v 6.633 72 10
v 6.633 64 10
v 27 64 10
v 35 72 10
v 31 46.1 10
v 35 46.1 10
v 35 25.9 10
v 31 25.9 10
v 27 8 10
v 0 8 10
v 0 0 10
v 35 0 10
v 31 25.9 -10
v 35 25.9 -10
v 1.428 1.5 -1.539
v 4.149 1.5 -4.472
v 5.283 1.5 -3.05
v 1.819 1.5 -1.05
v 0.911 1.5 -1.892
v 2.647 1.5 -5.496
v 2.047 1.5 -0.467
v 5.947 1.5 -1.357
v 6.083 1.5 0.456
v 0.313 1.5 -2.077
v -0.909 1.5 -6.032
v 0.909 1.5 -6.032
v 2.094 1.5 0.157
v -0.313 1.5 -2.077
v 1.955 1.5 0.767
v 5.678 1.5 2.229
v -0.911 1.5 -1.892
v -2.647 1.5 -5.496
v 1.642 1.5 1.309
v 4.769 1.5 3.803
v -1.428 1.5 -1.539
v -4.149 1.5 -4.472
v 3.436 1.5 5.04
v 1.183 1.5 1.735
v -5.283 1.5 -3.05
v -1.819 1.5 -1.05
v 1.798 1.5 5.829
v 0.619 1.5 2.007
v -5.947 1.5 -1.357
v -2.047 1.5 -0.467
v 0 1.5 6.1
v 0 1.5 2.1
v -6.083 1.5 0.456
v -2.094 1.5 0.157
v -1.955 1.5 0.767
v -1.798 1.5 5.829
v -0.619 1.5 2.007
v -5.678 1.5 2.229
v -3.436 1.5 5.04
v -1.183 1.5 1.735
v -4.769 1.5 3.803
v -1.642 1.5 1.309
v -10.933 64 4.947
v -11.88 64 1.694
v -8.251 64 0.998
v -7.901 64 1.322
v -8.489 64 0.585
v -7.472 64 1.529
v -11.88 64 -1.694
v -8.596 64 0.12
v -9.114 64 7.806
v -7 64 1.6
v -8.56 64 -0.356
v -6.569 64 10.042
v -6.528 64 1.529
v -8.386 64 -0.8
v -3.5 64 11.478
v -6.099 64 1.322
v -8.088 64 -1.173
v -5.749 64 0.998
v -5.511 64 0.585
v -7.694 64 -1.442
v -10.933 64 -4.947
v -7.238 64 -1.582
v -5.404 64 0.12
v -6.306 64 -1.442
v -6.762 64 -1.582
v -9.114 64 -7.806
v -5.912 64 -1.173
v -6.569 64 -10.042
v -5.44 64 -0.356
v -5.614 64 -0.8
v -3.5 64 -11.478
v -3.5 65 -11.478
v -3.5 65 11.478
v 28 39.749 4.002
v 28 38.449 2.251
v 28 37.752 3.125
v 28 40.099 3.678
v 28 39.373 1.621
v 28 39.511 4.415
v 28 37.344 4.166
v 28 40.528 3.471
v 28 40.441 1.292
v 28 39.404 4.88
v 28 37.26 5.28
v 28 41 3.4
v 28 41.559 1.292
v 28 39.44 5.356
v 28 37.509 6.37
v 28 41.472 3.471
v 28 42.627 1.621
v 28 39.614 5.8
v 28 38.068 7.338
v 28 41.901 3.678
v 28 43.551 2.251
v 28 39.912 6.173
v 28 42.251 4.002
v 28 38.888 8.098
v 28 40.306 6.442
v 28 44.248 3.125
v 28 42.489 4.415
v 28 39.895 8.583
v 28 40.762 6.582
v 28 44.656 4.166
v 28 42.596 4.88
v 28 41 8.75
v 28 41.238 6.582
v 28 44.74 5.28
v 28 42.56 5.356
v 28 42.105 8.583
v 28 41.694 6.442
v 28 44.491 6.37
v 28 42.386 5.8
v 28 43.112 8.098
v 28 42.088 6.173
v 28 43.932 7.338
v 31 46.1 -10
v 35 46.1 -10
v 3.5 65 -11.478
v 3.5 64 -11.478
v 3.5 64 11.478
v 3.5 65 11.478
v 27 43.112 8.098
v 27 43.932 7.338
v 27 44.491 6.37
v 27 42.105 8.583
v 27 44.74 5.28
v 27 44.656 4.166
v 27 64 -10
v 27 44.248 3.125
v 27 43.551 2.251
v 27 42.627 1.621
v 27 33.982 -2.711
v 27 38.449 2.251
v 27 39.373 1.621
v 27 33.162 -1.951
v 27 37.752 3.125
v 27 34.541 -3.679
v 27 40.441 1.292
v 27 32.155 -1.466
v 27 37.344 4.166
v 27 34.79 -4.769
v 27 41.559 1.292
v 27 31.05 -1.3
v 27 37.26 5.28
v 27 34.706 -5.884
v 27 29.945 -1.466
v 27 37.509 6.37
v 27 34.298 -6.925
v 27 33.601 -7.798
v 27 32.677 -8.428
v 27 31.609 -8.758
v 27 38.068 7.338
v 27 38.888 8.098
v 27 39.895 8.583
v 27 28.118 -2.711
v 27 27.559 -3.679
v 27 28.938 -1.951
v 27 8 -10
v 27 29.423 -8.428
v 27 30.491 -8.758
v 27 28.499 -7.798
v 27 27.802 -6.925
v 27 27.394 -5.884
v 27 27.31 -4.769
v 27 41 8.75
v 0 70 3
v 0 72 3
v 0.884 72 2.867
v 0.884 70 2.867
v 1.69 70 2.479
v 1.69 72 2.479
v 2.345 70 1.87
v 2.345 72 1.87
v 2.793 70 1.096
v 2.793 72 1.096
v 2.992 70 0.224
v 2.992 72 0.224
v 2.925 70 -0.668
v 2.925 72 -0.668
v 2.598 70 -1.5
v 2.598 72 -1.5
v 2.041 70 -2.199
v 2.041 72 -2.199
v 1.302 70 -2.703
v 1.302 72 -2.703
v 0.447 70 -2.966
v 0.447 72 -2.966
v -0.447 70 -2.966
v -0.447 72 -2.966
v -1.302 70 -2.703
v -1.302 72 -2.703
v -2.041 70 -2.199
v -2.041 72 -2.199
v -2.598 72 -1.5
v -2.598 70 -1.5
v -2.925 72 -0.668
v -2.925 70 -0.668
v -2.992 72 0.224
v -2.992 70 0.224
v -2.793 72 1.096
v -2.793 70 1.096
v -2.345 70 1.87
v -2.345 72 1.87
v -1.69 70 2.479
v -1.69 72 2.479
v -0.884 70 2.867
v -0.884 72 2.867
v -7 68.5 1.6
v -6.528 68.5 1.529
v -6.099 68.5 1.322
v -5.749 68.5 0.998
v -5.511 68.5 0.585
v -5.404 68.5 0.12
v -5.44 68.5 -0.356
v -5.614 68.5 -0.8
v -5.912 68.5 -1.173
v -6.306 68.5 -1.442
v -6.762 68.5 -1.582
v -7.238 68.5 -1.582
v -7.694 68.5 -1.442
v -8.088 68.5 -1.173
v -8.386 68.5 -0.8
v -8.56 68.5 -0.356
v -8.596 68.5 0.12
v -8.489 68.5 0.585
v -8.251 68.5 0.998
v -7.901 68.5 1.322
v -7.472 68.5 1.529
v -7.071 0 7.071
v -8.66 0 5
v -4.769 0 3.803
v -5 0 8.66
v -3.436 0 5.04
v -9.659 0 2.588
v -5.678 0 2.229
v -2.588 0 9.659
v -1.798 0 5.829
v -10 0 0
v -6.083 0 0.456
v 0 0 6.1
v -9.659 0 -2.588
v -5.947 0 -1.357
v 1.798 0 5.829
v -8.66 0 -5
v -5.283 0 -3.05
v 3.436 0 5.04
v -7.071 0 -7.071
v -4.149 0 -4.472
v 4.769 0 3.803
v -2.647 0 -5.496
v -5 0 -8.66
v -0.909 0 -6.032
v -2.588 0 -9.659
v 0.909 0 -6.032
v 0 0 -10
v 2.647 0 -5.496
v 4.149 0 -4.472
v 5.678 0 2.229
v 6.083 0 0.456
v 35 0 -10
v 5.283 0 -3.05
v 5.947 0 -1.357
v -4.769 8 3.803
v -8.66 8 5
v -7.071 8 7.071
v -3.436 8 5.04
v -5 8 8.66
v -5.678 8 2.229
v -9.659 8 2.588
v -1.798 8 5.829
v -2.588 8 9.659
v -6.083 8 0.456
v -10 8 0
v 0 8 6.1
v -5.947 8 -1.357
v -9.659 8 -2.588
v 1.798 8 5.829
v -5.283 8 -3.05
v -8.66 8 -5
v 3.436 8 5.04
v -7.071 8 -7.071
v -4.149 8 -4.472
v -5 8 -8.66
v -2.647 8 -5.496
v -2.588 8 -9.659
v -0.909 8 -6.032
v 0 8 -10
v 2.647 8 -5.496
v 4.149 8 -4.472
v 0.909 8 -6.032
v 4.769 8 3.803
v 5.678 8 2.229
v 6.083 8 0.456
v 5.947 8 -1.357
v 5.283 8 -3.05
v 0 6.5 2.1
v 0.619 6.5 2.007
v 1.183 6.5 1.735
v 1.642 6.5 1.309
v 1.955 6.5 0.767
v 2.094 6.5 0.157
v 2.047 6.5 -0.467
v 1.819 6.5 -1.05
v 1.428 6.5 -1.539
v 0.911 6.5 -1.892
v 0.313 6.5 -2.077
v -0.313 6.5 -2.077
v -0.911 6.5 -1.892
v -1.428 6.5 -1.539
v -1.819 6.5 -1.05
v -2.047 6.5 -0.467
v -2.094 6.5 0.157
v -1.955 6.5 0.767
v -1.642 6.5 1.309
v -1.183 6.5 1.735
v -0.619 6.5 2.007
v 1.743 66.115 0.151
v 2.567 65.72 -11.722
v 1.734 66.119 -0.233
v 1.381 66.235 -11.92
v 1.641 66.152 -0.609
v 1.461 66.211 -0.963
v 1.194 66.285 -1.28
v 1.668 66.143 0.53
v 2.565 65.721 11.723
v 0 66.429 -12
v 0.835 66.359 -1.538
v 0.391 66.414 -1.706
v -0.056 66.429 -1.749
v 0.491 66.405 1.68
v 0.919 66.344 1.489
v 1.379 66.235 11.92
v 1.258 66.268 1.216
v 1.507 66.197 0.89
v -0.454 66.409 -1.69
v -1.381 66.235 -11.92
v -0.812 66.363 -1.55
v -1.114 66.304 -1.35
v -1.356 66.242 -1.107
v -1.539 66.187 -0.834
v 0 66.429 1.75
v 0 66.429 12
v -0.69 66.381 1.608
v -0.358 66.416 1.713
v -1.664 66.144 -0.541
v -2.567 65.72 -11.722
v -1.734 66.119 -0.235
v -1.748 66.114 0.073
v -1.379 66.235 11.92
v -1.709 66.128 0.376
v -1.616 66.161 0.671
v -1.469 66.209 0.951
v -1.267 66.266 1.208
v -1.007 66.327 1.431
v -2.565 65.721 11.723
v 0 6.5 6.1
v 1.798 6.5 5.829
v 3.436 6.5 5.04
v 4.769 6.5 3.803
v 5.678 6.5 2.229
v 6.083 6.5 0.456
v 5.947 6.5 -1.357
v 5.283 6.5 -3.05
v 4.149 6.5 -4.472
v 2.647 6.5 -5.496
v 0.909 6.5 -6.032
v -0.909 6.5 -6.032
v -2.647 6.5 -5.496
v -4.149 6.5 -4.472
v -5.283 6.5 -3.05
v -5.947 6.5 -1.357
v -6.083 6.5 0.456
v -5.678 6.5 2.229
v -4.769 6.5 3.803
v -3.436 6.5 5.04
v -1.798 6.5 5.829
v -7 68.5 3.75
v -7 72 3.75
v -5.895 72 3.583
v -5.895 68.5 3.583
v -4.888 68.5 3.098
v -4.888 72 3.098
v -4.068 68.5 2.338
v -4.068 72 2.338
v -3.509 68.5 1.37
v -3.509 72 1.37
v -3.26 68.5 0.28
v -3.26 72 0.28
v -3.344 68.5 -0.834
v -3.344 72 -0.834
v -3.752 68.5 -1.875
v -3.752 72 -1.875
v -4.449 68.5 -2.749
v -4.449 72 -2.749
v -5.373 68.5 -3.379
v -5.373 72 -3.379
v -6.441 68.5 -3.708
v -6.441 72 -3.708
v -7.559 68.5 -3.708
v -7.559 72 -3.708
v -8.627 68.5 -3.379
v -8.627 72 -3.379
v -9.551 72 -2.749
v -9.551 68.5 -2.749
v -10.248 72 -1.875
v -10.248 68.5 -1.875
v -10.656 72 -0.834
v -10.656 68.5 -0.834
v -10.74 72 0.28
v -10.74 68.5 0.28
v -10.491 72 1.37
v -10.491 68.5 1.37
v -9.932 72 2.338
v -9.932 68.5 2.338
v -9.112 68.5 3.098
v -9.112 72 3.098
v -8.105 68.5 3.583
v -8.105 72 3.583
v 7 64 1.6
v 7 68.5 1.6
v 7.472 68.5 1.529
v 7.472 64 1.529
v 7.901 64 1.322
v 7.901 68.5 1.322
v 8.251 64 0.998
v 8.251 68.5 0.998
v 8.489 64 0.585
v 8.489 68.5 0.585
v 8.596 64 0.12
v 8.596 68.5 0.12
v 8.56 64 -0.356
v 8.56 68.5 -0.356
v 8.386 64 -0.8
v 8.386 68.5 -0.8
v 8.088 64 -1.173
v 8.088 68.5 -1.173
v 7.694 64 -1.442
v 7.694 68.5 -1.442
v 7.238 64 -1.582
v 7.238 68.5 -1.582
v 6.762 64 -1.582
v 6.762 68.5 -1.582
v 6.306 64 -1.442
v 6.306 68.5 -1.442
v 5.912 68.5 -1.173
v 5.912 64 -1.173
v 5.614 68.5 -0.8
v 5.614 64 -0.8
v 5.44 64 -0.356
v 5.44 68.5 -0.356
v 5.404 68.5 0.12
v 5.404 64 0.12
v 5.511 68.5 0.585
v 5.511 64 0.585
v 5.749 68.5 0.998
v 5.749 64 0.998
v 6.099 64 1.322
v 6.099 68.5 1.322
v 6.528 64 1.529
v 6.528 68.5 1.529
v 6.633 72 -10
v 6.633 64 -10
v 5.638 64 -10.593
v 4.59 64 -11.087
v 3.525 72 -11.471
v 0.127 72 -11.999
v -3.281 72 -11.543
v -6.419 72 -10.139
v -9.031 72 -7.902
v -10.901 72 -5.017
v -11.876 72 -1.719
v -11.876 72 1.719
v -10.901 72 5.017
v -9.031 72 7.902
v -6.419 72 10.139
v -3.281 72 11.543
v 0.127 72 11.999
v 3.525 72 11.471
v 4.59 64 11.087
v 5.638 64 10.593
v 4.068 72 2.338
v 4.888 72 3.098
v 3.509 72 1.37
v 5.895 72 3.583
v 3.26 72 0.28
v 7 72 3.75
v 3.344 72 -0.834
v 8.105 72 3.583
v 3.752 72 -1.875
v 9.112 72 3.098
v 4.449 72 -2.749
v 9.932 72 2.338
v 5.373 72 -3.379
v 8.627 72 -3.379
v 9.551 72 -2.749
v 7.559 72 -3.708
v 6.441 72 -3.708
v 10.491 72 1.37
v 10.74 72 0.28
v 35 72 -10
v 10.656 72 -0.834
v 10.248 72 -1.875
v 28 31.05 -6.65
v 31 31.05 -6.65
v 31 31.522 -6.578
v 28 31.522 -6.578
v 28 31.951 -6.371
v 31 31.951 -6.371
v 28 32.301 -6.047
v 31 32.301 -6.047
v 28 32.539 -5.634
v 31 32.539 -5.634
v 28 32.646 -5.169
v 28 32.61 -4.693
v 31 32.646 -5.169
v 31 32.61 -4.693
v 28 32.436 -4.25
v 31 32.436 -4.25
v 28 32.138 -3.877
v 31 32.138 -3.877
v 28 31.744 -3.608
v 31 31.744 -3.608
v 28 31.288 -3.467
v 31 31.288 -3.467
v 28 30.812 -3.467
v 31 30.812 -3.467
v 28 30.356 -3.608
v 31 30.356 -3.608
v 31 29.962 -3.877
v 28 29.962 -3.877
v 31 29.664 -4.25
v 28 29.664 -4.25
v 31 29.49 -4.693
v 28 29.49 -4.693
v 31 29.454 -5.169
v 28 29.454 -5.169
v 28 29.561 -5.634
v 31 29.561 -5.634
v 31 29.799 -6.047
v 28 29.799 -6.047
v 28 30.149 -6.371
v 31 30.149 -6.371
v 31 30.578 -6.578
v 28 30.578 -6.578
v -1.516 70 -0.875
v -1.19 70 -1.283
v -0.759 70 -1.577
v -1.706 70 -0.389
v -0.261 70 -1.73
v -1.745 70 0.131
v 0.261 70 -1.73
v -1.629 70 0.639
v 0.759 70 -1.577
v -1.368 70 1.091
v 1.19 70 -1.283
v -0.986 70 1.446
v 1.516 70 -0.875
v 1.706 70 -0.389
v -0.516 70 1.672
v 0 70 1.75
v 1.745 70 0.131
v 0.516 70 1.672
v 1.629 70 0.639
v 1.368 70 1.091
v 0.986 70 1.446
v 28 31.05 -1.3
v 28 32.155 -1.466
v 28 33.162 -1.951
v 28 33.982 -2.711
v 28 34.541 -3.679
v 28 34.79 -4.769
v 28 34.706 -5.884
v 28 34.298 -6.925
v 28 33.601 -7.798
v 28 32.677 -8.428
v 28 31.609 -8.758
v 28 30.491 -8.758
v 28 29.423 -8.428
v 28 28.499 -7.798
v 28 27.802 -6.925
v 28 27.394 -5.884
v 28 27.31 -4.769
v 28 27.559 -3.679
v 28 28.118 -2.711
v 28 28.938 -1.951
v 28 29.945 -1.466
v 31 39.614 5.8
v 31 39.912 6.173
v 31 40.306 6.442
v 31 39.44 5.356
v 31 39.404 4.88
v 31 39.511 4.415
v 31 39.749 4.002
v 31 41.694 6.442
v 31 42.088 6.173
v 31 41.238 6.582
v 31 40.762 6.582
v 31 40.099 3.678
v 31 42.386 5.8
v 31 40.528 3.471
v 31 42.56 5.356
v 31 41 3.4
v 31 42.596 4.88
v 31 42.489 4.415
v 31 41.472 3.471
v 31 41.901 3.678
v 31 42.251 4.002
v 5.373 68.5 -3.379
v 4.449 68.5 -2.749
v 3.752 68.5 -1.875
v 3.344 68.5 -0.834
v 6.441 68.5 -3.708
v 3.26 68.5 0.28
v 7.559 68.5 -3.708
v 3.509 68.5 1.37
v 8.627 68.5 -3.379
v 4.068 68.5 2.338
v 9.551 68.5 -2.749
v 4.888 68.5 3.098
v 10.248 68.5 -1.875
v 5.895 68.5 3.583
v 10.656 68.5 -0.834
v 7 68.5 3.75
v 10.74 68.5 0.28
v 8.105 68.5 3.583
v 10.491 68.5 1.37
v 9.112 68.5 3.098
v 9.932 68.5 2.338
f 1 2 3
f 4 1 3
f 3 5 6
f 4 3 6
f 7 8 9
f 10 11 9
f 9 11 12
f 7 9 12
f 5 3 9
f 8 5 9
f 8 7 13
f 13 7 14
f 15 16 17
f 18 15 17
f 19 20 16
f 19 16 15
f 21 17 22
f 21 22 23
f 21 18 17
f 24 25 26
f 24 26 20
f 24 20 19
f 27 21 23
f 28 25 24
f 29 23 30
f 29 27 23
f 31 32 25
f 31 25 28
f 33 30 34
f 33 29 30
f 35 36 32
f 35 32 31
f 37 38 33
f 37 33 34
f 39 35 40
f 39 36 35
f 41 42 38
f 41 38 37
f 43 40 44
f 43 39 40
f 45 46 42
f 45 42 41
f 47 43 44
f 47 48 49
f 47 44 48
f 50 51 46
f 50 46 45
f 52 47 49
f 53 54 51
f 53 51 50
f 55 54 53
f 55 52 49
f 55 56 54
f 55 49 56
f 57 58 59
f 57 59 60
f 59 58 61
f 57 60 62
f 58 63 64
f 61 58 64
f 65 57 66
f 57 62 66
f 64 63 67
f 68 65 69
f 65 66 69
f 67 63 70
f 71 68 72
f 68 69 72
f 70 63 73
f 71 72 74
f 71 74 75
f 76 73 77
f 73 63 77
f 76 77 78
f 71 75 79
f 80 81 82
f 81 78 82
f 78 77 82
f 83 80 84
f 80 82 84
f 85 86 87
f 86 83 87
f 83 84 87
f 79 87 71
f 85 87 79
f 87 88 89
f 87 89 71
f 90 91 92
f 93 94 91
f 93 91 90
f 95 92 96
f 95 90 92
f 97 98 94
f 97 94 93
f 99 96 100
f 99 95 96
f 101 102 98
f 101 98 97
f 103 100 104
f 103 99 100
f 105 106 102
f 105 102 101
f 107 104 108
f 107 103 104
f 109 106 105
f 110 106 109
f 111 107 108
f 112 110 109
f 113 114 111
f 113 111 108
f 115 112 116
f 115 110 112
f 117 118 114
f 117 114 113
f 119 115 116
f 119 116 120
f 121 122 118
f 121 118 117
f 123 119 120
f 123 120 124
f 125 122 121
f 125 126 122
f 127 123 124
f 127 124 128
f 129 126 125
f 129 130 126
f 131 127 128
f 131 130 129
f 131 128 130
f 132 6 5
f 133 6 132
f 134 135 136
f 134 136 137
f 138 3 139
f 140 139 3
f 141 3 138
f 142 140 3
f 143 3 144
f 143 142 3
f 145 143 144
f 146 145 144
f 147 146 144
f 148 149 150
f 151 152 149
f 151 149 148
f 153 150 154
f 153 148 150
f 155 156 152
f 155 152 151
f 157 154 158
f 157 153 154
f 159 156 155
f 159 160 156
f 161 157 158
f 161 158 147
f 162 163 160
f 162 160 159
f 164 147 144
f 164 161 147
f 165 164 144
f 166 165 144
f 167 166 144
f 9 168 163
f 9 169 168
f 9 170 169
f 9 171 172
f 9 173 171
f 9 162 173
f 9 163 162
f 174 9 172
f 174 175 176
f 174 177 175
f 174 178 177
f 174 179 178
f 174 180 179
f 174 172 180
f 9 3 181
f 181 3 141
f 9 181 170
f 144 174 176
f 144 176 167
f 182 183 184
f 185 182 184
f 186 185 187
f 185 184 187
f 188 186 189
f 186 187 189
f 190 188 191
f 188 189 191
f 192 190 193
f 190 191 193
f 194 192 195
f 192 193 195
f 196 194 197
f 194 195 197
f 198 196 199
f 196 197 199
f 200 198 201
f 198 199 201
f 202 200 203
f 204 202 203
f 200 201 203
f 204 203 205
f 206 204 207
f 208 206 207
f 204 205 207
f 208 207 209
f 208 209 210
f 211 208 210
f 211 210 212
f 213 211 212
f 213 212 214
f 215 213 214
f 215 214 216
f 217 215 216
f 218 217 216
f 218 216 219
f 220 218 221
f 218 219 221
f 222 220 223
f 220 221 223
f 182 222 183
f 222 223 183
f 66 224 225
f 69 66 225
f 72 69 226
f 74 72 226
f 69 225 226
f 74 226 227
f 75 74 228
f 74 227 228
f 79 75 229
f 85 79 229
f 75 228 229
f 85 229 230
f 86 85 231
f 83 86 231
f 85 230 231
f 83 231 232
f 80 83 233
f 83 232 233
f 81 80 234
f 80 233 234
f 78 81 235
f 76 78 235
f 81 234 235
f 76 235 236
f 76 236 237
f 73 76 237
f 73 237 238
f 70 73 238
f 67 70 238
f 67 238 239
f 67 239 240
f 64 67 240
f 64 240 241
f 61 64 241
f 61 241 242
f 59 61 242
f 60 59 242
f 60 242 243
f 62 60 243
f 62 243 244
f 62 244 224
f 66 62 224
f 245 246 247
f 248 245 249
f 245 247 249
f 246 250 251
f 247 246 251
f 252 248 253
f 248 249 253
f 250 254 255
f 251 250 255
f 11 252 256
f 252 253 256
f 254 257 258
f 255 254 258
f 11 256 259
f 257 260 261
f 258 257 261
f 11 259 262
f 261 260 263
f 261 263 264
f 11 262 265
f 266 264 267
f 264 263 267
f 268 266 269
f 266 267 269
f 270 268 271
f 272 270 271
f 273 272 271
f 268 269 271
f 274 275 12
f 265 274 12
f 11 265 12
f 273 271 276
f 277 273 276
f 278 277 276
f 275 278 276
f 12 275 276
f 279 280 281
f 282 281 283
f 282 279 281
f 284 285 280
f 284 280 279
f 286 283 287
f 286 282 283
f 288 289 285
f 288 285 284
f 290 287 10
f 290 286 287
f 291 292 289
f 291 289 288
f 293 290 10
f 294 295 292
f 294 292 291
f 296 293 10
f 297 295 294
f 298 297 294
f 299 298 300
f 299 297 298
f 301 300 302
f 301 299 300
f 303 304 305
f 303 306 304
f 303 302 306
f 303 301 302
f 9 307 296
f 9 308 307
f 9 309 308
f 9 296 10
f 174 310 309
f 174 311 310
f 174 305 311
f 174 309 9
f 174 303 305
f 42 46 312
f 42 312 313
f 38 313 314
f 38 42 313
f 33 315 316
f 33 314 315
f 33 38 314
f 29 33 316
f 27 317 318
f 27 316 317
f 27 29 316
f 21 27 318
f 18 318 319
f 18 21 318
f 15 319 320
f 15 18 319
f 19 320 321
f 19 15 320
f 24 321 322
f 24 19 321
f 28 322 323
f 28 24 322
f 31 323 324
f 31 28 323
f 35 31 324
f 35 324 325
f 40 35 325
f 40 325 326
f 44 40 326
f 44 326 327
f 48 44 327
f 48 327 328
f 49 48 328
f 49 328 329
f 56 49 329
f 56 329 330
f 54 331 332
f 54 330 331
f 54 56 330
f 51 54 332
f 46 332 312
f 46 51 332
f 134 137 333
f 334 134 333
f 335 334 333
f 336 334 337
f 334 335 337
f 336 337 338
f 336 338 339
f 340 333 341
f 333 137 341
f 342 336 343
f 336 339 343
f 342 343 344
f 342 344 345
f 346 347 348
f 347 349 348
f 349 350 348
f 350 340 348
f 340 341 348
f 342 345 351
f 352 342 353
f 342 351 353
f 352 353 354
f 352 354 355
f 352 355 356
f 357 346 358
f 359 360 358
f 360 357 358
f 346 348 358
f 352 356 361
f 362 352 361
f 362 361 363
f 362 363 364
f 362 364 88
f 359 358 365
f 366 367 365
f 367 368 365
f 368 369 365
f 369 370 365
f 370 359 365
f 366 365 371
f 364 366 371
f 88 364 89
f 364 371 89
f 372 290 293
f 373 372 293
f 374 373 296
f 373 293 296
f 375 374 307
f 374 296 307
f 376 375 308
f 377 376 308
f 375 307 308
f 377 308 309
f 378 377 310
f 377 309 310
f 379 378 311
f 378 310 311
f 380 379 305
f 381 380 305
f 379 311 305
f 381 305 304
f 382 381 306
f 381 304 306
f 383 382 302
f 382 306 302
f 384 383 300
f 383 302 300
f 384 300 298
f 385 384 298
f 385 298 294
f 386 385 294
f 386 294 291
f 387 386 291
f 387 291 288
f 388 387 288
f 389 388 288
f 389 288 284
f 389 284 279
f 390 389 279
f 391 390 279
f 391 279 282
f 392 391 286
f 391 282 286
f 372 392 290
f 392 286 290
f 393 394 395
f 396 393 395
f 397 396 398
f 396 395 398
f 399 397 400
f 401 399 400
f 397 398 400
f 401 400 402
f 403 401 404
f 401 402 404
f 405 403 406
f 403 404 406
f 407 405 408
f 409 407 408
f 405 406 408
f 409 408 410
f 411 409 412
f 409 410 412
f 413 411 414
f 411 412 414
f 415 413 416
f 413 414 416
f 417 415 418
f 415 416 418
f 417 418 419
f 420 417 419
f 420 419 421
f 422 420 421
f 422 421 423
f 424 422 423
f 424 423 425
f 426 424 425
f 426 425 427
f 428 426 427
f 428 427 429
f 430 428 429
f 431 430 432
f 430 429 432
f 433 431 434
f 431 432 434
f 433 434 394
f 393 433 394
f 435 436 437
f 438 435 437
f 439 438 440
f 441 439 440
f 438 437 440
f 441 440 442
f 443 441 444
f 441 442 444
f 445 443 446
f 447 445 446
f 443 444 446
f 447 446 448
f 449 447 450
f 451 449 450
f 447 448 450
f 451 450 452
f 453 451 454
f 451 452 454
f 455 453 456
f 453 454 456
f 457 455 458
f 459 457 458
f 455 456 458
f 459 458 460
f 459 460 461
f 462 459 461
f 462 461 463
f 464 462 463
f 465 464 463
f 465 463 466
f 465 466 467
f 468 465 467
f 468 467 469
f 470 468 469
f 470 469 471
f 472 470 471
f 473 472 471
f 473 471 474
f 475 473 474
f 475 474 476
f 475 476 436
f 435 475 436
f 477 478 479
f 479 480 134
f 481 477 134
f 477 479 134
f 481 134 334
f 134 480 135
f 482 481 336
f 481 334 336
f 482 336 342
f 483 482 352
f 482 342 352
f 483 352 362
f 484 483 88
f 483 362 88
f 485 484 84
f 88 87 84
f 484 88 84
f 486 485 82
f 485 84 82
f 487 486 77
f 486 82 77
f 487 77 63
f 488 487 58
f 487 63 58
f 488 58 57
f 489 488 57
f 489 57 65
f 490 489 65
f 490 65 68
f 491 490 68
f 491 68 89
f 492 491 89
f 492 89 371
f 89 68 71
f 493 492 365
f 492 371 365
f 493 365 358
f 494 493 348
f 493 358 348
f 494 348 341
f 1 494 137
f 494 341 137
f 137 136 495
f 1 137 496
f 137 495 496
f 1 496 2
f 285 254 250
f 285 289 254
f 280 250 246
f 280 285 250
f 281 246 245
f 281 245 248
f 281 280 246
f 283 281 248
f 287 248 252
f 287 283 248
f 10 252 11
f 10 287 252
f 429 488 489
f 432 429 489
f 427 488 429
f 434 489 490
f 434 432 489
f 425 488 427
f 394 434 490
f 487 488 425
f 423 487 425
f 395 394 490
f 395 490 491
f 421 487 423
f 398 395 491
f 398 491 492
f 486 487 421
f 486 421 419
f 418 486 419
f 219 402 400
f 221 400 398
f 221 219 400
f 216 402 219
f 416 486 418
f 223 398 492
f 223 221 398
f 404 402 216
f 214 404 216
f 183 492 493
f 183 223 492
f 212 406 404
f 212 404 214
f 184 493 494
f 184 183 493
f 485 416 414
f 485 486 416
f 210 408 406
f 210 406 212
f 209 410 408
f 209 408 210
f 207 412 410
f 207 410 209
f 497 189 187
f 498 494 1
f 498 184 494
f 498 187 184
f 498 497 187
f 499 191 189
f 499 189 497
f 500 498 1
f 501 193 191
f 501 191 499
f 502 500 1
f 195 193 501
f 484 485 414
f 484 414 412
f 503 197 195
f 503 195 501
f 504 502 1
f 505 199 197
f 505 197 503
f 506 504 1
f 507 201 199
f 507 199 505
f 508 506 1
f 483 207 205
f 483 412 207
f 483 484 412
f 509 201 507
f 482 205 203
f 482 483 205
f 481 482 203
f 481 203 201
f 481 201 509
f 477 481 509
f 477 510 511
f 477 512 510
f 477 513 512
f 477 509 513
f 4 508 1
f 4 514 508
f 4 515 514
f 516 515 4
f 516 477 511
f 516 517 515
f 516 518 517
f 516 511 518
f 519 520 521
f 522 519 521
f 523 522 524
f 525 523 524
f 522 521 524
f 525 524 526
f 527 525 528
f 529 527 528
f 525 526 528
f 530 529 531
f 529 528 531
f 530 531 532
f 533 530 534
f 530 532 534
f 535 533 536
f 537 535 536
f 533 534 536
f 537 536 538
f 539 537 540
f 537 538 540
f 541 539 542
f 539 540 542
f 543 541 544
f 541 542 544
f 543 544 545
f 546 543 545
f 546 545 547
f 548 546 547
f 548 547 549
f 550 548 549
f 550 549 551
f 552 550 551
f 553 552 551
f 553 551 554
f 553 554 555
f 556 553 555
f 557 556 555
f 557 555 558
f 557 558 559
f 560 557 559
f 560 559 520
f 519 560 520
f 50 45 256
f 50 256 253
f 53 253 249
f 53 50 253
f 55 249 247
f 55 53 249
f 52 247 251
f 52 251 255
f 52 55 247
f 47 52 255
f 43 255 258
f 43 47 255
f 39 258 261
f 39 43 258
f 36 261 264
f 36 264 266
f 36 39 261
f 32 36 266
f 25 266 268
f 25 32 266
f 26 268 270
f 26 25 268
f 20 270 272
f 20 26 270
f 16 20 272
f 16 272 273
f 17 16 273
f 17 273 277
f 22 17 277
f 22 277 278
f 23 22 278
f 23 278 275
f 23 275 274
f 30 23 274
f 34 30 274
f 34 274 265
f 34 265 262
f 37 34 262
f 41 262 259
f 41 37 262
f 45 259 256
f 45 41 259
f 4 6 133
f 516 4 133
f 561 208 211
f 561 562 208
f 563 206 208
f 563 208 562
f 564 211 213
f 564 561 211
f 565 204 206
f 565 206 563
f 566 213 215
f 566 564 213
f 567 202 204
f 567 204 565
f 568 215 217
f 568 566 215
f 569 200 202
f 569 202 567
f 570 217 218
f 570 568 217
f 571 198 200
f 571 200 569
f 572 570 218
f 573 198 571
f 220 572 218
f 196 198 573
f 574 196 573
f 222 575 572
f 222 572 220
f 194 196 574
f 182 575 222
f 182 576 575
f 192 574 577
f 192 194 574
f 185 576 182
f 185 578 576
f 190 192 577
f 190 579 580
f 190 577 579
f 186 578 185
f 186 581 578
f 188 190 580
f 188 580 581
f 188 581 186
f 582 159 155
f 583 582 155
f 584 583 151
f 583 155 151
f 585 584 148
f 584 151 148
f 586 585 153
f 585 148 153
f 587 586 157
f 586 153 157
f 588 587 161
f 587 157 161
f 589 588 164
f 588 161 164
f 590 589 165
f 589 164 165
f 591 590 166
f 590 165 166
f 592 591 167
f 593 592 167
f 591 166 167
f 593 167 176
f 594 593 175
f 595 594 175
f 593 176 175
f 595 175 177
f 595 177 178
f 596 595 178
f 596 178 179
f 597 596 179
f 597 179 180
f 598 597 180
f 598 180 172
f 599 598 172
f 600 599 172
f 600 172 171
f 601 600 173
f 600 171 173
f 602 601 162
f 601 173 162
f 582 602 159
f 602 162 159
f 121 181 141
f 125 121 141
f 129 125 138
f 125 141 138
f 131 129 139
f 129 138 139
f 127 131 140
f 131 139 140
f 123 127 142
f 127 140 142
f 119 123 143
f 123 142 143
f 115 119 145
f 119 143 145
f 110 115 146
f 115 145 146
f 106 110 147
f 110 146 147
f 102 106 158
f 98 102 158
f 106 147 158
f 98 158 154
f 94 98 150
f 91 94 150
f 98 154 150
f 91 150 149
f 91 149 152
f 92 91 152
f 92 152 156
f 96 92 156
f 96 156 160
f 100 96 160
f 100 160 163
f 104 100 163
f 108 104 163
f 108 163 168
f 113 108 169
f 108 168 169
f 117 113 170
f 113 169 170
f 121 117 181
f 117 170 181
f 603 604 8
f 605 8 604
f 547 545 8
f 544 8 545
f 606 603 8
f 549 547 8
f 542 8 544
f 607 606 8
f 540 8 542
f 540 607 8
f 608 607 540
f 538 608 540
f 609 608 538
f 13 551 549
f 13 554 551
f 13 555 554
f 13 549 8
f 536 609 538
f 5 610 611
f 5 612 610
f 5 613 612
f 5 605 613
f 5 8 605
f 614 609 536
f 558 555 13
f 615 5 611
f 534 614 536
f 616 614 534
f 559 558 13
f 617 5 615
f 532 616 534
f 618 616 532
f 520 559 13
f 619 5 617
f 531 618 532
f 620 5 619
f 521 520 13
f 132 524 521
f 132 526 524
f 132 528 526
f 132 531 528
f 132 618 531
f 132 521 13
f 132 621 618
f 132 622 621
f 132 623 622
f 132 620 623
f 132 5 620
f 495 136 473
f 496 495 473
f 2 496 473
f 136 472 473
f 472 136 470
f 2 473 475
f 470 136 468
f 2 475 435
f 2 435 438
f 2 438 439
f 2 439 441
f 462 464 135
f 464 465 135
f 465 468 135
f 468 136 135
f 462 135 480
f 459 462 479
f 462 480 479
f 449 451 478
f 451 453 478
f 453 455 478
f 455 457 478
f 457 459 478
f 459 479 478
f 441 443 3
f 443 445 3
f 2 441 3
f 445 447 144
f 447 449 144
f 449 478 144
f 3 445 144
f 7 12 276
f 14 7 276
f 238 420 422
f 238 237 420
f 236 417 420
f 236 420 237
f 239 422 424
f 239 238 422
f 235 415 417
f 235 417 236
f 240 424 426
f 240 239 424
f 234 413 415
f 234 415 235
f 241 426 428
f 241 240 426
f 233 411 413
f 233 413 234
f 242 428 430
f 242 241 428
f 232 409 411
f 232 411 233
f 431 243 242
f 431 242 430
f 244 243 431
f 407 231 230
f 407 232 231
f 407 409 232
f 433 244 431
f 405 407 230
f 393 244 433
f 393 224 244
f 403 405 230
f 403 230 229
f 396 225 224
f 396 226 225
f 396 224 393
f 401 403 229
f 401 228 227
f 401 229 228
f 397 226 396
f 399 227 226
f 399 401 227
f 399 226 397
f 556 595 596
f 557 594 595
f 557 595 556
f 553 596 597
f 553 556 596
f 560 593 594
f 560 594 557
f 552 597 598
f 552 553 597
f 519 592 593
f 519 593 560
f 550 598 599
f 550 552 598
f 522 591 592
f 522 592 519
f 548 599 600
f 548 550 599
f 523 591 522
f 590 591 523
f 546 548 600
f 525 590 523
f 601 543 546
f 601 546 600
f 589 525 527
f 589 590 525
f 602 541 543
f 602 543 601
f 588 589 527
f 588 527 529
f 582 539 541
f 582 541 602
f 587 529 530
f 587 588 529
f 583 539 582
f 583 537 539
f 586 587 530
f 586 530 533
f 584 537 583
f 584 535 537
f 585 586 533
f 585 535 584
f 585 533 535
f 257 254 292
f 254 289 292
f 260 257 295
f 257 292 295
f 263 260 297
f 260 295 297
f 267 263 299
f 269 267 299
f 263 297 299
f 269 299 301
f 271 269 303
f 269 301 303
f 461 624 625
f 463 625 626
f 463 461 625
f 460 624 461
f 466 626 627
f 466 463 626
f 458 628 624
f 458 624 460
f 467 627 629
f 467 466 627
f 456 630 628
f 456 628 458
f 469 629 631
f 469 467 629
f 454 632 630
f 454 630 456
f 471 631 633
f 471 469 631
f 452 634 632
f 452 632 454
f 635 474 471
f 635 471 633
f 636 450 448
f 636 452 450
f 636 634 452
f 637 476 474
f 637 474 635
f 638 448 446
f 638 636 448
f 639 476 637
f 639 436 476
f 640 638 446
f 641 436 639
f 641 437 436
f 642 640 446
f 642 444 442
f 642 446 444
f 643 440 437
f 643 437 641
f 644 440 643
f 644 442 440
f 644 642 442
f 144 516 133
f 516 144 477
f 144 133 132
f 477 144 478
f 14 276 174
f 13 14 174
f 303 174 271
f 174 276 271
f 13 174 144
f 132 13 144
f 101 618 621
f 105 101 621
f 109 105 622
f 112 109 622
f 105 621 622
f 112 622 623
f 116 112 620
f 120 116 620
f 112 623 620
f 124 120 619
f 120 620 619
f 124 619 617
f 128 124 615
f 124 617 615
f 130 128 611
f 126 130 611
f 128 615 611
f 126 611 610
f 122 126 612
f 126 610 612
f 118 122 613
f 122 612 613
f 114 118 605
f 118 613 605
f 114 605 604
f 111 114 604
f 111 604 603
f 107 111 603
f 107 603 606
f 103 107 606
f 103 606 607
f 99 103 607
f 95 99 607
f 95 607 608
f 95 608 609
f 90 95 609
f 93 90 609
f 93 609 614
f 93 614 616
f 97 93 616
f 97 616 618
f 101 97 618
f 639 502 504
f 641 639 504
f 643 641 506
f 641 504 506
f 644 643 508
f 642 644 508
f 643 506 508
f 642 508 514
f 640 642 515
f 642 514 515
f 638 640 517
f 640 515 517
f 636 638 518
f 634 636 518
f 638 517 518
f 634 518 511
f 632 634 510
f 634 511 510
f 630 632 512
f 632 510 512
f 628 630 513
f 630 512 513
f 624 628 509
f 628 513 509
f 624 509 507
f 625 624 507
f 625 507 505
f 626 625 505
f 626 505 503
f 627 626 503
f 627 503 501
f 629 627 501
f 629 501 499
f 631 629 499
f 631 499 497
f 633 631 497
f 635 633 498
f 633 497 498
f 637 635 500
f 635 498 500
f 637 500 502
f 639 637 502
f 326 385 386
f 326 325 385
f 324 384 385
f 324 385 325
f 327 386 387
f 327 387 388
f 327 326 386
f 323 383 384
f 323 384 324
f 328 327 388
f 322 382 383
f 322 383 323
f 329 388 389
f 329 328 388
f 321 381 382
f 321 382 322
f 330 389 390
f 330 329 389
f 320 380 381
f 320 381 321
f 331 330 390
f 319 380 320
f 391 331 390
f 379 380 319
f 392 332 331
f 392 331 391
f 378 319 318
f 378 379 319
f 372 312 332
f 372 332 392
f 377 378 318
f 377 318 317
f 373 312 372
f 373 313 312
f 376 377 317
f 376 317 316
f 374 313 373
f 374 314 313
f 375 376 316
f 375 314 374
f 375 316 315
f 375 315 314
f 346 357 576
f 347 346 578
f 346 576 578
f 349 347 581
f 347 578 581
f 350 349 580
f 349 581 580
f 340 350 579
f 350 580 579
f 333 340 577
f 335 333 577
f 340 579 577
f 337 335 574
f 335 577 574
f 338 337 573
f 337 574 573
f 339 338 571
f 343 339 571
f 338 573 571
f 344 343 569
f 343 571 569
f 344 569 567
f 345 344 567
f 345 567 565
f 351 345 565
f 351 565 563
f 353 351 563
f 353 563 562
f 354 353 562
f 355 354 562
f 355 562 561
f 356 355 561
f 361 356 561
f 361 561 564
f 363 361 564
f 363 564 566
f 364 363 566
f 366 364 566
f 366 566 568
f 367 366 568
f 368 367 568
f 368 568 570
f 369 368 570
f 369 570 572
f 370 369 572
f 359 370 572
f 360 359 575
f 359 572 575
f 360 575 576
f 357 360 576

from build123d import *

# Parameters (mm, degrees)
SZKIC1_W                        = 45
SZKIC1_H                        = 20
SZKIC1_R                        = 2.1
DODANIE_WYCI_GNI_CIE1_DEPTH     = 8
SZKIC2_R                        = 6.1
WYTNIJ_WYCI_GNI_CIE1_DEPTH      = 1.5
WYTNIJ_WYCI_GNI_CIE2_START      = -1.5
SZKIC3_R                        = 6.1
WYTNIJ_WYCI_GNI_CIE2_DEPTH      = 1.5
SZKIC4_W                        = 8
SZKIC4_H                        = 20
DODANIE_WYCI_GNI_CIE2_DEPTH     = 56
ZAOKR_GLENIE1_R                 = 10
DODANIE_WYCI_GNI_CIE3_DEPTH     = 8
WYTNIJ_WYCI_GNI_CIE3_REACH      = 82.951
SZKIC6_R                        = 1.6
SZKIC7_R                        = 3.75
WYTNIJ_WYCI_GNI_CIE4_DEPTH      = 3.5
WYTNIJ_WYCI_GNI_CIE5_REACH      = 85.576
WYTNIJ_WYCI_GNI_CIE5_END_RADIUS = 12
SZKIC10_R                       = 3
WYTNIJ_WYCI_GNI_CIE6_DEPTH      = 2
WYTNIJ_WYCI_GNI_CIE7_REACH      = 81.177
WYTNIJ_WYCI_GNI_CIE7_END_RADIUS = 5
SZKIC11_R                       = 1.75
SZKIC12_W                       = 20
SZKIC12_H                       = 20.2
WYTNIJ_WYCI_GNI_CIE8_DEPTH      = 4
WYTNIJ_WYCI_GNI_CIE9_REACH      = 86.717
SZKIC13_R                       = 1.6
SZKIC14_R                       = 3.75
WYTNIJ_WYCI_GNI_CIE10_DEPTH     = 1


with BuildPart() as part:
    # Szkic1 → Dodanie-wyciągnięcie1 (new body)
    with BuildSketch(Plane(origin=(0, 0, 0), x_dir=(1, 0, 0), z_dir=(0, 1, 0))):
        with Locations((12.5, 0)):
            Rectangle(SZKIC1_W, SZKIC1_H)
        with Locations(Location((0, 0, 0), (0, 0, 270))):
            Circle(SZKIC1_R, mode=Mode.SUBTRACT)
    extrude(amount=DODANIE_WYCI_GNI_CIE1_DEPTH)

    # Szkic2 → Wytnij-wyciągnięcie1 (cut)
    with BuildSketch(Plane(origin=(0, 8, 0), x_dir=(1, 0, 0), z_dir=(0, 1, 0))):
        with Locations(Location((0, 0, 0), (0, 0, 270))):
            Circle(SZKIC2_R)
    extrude(amount=-WYTNIJ_WYCI_GNI_CIE1_DEPTH, mode=Mode.SUBTRACT)

    # Szkic3 → Wytnij-wyciągnięcie2 (cut)
    with BuildSketch(Plane.XZ.offset(WYTNIJ_WYCI_GNI_CIE2_START)):
        with Locations(Location((0, 0, 0), (0, 0, 90))):
            Circle(SZKIC3_R)
    extrude(amount=WYTNIJ_WYCI_GNI_CIE2_DEPTH, mode=Mode.SUBTRACT)

    # Szkic4 → Dodanie-wyciągnięcie2 (add)
    with BuildSketch(Plane(origin=(0, 8, 0), x_dir=(1, 0, 0), z_dir=(0, 1, 0))):
        with Locations((31, 0)):
            Rectangle(SZKIC4_W, SZKIC4_H)
    extrude(amount=DODANIE_WYCI_GNI_CIE2_DEPTH)

    # Zaokrąglenie1
    zaokr_glenie1_edges = [part.edges().sort_by_distance(p)[0] for p in [
        (-10, 4, -10),
        (-10, 4, 10),
    ]]
    fillet(zaokr_glenie1_edges, radius=ZAOKR_GLENIE1_R - 0.0001)  # a hair under: the kernel refuses the full size

    # Szkic5 → Dodanie-wyciągnięcie3 (add)
    with BuildSketch(Plane(origin=(0, 64, 0), x_dir=(1, 0, 0), z_dir=(0, 1, 0))):
        with BuildLine():
            Line((35, -10), (35, 10))
            Line((35, 10), (6.633249581, 10))
            ThreePointArc((6.633249581, 10), (-12, 0), (6.633249581, -10))
            Line((6.633249581, -10), (35, -10))
        make_face()
    extrude(amount=DODANIE_WYCI_GNI_CIE3_DEPTH)

    # Szkic6 → Wytnij-wyciągnięcie3 (cut, up to next)
    with BuildSketch(Plane(origin=(0, 72, 0), x_dir=(1, 0, 0), z_dir=(0, 1, 0)), mode=Mode.PRIVATE) as wytnij_wyci_gni_cie3_sk1:
        with Locations(Location((-7, 0, 0), (0, 0, 270))):
            Circle(SZKIC6_R)
    wytnij_wyci_gni_cie3_tool1 = extrude(wytnij_wyci_gni_cie3_sk1.sketch, amount=-WYTNIJ_WYCI_GNI_CIE3_REACH, mode=Mode.PRIVATE) & part.part
    # Szkic6 → Wytnij-wyciągnięcie3 (cut, up to next)
    with BuildSketch(Plane(origin=(0, 72, 0), x_dir=(1, 0, 0), z_dir=(0, 1, 0)), mode=Mode.PRIVATE) as wytnij_wyci_gni_cie3_sk2:
        with Locations(Location((7, 0, 0), (0, 0, 270))):
            Circle(SZKIC6_R)
    wytnij_wyci_gni_cie3_tool2 = extrude(wytnij_wyci_gni_cie3_sk2.sketch, amount=-WYTNIJ_WYCI_GNI_CIE3_REACH, mode=Mode.PRIVATE) & part.part
    add(wytnij_wyci_gni_cie3_tool1.solids().sort_by_distance((-7, 72, 0))[0], mode=Mode.SUBTRACT)
    add(wytnij_wyci_gni_cie3_tool2.solids().sort_by_distance((7, 72, 0))[0], mode=Mode.SUBTRACT)

    # Szkic7 → Wytnij-wyciągnięcie4 (cut)
    with BuildSketch(Plane(origin=(0, 72, 0), x_dir=(1, 0, 0), z_dir=(0, 1, 0))):
        with Locations(Location((7, 0, 0), (0, 0, 270))):
            Circle(SZKIC7_R)
        with Locations(Location((-7, 0, 0), (0, 0, 270))):
            Circle(SZKIC7_R)
    extrude(amount=-WYTNIJ_WYCI_GNI_CIE4_DEPTH, mode=Mode.SUBTRACT)

    # Wytnij-wyciągnięcie5: up to this cylinder (the profile starts inside it)
    wytnij_wyci_gni_cie5_end = Plane(origin=(0, 65.035303, 0), z_dir=(0, -1, 0)) * Cylinder(WYTNIJ_WYCI_GNI_CIE5_END_RADIUS, 196.152, mode=Mode.PRIVATE)
    # Szkic9 → Wytnij-wyciągnięcie5 (cut, up to the surface)
    with BuildSketch(Plane.XY.offset(12), mode=Mode.PRIVATE) as wytnij_wyci_gni_cie5_sk1:
        with BuildLine():
            Line((-3.5, 64), (3.5, 64))
            Line((3.5, 64), (3.5, 65))
            ThreePointArc((3.5, 65), (0, 66.429285786), (-3.5, 65))
            Line((-3.5, 65), (-3.5, 64))
        make_face()
    wytnij_wyci_gni_cie5_tool1 = extrude(wytnij_wyci_gni_cie5_sk1.sketch, amount=-WYTNIJ_WYCI_GNI_CIE5_REACH, mode=Mode.PRIVATE) & wytnij_wyci_gni_cie5_end
    add(wytnij_wyci_gni_cie5_tool1.solids().sort_by_distance((0, 65.035303, 12))[0], mode=Mode.SUBTRACT)

    # Szkic10 → Wytnij-wyciągnięcie6 (cut)
    with BuildSketch(Plane(origin=(0, 72, 0), x_dir=(1, 0, 0), z_dir=(0, 1, 0))):
        with Locations(Location((0, 0, 0), (0, 0, 270))):
            Circle(SZKIC10_R)
    extrude(amount=-WYTNIJ_WYCI_GNI_CIE6_DEPTH, mode=Mode.SUBTRACT)

    # Wytnij-wyciągnięcie7: up to this cylinder (the profile starts outside it)
    wytnij_wyci_gni_cie7_end = Plane(origin=(0, 61.429285786, 0), z_dir=(0, 0, 1)) * Cylinder(WYTNIJ_WYCI_GNI_CIE7_END_RADIUS, 173.354, mode=Mode.PRIVATE)
    # Szkic11 → Wytnij-wyciągnięcie7 (cut, up to the surface)
    with BuildSketch(Plane(origin=(0, 70, 0), x_dir=(1, 0, 0), z_dir=(0, 1, 0)), mode=Mode.PRIVATE) as wytnij_wyci_gni_cie7_sk1:
        with Locations(Location((0, 0, 0), (0, 0, 270))):
            Circle(SZKIC11_R)
    wytnij_wyci_gni_cie7_tool1 = extrude(wytnij_wyci_gni_cie7_sk1.sketch, amount=-WYTNIJ_WYCI_GNI_CIE7_REACH, mode=Mode.PRIVATE) - wytnij_wyci_gni_cie7_end
    add(wytnij_wyci_gni_cie7_tool1.solids().sort_by_distance((0, 70, 0))[0], mode=Mode.SUBTRACT)

    # Szkic12 → Wytnij-wyciągnięcie8 (cut)
    with BuildSketch(Plane(origin=(35, 0, 0), x_dir=(0, 0, -1), z_dir=(1, 0, 0))):
        with Locations((0, 36)):
            Rectangle(SZKIC12_W, SZKIC12_H)
    extrude(amount=-WYTNIJ_WYCI_GNI_CIE8_DEPTH, mode=Mode.SUBTRACT)

    # Szkic13 → Wytnij-wyciągnięcie9 (cut, up to next)
    with BuildSketch(Plane(origin=(31, 0, 0), x_dir=(0, 0, -1), z_dir=(1, 0, 0)), mode=Mode.PRIVATE) as wytnij_wyci_gni_cie9_sk1:
        with Locations((-5, 41)):
            Circle(SZKIC13_R)
    wytnij_wyci_gni_cie9_tool1 = extrude(wytnij_wyci_gni_cie9_sk1.sketch, amount=-WYTNIJ_WYCI_GNI_CIE9_REACH, mode=Mode.PRIVATE) & part.part
    # Szkic13 → Wytnij-wyciągnięcie9 (cut, up to next)
    with BuildSketch(Plane(origin=(31, 0, 0), x_dir=(0, 0, -1), z_dir=(1, 0, 0)), mode=Mode.PRIVATE) as wytnij_wyci_gni_cie9_sk2:
        with Locations((5.0495025, 31.049997525)):
            Circle(SZKIC13_R)
    wytnij_wyci_gni_cie9_tool2 = extrude(wytnij_wyci_gni_cie9_sk2.sketch, amount=-WYTNIJ_WYCI_GNI_CIE9_REACH, mode=Mode.PRIVATE) & part.part
    add(wytnij_wyci_gni_cie9_tool1.solids().sort_by_distance((31, 41, 5))[0], mode=Mode.SUBTRACT)
    add(wytnij_wyci_gni_cie9_tool2.solids().sort_by_distance((31, 31.049998, -5.049502))[0], mode=Mode.SUBTRACT)

    # Szkic14 → Wytnij-wyciągnięcie10 (cut)
    with BuildSketch(Plane.ZY.offset(-27)):
        with Locations((5, 41)):
            Circle(SZKIC14_R)
        with Locations((-5.0495025, 31.049997525)):
            Circle(SZKIC14_R)
    extrude(amount=-WYTNIJ_WYCI_GNI_CIE10_DEPTH, mode=Mode.SUBTRACT)


solid = part.part
